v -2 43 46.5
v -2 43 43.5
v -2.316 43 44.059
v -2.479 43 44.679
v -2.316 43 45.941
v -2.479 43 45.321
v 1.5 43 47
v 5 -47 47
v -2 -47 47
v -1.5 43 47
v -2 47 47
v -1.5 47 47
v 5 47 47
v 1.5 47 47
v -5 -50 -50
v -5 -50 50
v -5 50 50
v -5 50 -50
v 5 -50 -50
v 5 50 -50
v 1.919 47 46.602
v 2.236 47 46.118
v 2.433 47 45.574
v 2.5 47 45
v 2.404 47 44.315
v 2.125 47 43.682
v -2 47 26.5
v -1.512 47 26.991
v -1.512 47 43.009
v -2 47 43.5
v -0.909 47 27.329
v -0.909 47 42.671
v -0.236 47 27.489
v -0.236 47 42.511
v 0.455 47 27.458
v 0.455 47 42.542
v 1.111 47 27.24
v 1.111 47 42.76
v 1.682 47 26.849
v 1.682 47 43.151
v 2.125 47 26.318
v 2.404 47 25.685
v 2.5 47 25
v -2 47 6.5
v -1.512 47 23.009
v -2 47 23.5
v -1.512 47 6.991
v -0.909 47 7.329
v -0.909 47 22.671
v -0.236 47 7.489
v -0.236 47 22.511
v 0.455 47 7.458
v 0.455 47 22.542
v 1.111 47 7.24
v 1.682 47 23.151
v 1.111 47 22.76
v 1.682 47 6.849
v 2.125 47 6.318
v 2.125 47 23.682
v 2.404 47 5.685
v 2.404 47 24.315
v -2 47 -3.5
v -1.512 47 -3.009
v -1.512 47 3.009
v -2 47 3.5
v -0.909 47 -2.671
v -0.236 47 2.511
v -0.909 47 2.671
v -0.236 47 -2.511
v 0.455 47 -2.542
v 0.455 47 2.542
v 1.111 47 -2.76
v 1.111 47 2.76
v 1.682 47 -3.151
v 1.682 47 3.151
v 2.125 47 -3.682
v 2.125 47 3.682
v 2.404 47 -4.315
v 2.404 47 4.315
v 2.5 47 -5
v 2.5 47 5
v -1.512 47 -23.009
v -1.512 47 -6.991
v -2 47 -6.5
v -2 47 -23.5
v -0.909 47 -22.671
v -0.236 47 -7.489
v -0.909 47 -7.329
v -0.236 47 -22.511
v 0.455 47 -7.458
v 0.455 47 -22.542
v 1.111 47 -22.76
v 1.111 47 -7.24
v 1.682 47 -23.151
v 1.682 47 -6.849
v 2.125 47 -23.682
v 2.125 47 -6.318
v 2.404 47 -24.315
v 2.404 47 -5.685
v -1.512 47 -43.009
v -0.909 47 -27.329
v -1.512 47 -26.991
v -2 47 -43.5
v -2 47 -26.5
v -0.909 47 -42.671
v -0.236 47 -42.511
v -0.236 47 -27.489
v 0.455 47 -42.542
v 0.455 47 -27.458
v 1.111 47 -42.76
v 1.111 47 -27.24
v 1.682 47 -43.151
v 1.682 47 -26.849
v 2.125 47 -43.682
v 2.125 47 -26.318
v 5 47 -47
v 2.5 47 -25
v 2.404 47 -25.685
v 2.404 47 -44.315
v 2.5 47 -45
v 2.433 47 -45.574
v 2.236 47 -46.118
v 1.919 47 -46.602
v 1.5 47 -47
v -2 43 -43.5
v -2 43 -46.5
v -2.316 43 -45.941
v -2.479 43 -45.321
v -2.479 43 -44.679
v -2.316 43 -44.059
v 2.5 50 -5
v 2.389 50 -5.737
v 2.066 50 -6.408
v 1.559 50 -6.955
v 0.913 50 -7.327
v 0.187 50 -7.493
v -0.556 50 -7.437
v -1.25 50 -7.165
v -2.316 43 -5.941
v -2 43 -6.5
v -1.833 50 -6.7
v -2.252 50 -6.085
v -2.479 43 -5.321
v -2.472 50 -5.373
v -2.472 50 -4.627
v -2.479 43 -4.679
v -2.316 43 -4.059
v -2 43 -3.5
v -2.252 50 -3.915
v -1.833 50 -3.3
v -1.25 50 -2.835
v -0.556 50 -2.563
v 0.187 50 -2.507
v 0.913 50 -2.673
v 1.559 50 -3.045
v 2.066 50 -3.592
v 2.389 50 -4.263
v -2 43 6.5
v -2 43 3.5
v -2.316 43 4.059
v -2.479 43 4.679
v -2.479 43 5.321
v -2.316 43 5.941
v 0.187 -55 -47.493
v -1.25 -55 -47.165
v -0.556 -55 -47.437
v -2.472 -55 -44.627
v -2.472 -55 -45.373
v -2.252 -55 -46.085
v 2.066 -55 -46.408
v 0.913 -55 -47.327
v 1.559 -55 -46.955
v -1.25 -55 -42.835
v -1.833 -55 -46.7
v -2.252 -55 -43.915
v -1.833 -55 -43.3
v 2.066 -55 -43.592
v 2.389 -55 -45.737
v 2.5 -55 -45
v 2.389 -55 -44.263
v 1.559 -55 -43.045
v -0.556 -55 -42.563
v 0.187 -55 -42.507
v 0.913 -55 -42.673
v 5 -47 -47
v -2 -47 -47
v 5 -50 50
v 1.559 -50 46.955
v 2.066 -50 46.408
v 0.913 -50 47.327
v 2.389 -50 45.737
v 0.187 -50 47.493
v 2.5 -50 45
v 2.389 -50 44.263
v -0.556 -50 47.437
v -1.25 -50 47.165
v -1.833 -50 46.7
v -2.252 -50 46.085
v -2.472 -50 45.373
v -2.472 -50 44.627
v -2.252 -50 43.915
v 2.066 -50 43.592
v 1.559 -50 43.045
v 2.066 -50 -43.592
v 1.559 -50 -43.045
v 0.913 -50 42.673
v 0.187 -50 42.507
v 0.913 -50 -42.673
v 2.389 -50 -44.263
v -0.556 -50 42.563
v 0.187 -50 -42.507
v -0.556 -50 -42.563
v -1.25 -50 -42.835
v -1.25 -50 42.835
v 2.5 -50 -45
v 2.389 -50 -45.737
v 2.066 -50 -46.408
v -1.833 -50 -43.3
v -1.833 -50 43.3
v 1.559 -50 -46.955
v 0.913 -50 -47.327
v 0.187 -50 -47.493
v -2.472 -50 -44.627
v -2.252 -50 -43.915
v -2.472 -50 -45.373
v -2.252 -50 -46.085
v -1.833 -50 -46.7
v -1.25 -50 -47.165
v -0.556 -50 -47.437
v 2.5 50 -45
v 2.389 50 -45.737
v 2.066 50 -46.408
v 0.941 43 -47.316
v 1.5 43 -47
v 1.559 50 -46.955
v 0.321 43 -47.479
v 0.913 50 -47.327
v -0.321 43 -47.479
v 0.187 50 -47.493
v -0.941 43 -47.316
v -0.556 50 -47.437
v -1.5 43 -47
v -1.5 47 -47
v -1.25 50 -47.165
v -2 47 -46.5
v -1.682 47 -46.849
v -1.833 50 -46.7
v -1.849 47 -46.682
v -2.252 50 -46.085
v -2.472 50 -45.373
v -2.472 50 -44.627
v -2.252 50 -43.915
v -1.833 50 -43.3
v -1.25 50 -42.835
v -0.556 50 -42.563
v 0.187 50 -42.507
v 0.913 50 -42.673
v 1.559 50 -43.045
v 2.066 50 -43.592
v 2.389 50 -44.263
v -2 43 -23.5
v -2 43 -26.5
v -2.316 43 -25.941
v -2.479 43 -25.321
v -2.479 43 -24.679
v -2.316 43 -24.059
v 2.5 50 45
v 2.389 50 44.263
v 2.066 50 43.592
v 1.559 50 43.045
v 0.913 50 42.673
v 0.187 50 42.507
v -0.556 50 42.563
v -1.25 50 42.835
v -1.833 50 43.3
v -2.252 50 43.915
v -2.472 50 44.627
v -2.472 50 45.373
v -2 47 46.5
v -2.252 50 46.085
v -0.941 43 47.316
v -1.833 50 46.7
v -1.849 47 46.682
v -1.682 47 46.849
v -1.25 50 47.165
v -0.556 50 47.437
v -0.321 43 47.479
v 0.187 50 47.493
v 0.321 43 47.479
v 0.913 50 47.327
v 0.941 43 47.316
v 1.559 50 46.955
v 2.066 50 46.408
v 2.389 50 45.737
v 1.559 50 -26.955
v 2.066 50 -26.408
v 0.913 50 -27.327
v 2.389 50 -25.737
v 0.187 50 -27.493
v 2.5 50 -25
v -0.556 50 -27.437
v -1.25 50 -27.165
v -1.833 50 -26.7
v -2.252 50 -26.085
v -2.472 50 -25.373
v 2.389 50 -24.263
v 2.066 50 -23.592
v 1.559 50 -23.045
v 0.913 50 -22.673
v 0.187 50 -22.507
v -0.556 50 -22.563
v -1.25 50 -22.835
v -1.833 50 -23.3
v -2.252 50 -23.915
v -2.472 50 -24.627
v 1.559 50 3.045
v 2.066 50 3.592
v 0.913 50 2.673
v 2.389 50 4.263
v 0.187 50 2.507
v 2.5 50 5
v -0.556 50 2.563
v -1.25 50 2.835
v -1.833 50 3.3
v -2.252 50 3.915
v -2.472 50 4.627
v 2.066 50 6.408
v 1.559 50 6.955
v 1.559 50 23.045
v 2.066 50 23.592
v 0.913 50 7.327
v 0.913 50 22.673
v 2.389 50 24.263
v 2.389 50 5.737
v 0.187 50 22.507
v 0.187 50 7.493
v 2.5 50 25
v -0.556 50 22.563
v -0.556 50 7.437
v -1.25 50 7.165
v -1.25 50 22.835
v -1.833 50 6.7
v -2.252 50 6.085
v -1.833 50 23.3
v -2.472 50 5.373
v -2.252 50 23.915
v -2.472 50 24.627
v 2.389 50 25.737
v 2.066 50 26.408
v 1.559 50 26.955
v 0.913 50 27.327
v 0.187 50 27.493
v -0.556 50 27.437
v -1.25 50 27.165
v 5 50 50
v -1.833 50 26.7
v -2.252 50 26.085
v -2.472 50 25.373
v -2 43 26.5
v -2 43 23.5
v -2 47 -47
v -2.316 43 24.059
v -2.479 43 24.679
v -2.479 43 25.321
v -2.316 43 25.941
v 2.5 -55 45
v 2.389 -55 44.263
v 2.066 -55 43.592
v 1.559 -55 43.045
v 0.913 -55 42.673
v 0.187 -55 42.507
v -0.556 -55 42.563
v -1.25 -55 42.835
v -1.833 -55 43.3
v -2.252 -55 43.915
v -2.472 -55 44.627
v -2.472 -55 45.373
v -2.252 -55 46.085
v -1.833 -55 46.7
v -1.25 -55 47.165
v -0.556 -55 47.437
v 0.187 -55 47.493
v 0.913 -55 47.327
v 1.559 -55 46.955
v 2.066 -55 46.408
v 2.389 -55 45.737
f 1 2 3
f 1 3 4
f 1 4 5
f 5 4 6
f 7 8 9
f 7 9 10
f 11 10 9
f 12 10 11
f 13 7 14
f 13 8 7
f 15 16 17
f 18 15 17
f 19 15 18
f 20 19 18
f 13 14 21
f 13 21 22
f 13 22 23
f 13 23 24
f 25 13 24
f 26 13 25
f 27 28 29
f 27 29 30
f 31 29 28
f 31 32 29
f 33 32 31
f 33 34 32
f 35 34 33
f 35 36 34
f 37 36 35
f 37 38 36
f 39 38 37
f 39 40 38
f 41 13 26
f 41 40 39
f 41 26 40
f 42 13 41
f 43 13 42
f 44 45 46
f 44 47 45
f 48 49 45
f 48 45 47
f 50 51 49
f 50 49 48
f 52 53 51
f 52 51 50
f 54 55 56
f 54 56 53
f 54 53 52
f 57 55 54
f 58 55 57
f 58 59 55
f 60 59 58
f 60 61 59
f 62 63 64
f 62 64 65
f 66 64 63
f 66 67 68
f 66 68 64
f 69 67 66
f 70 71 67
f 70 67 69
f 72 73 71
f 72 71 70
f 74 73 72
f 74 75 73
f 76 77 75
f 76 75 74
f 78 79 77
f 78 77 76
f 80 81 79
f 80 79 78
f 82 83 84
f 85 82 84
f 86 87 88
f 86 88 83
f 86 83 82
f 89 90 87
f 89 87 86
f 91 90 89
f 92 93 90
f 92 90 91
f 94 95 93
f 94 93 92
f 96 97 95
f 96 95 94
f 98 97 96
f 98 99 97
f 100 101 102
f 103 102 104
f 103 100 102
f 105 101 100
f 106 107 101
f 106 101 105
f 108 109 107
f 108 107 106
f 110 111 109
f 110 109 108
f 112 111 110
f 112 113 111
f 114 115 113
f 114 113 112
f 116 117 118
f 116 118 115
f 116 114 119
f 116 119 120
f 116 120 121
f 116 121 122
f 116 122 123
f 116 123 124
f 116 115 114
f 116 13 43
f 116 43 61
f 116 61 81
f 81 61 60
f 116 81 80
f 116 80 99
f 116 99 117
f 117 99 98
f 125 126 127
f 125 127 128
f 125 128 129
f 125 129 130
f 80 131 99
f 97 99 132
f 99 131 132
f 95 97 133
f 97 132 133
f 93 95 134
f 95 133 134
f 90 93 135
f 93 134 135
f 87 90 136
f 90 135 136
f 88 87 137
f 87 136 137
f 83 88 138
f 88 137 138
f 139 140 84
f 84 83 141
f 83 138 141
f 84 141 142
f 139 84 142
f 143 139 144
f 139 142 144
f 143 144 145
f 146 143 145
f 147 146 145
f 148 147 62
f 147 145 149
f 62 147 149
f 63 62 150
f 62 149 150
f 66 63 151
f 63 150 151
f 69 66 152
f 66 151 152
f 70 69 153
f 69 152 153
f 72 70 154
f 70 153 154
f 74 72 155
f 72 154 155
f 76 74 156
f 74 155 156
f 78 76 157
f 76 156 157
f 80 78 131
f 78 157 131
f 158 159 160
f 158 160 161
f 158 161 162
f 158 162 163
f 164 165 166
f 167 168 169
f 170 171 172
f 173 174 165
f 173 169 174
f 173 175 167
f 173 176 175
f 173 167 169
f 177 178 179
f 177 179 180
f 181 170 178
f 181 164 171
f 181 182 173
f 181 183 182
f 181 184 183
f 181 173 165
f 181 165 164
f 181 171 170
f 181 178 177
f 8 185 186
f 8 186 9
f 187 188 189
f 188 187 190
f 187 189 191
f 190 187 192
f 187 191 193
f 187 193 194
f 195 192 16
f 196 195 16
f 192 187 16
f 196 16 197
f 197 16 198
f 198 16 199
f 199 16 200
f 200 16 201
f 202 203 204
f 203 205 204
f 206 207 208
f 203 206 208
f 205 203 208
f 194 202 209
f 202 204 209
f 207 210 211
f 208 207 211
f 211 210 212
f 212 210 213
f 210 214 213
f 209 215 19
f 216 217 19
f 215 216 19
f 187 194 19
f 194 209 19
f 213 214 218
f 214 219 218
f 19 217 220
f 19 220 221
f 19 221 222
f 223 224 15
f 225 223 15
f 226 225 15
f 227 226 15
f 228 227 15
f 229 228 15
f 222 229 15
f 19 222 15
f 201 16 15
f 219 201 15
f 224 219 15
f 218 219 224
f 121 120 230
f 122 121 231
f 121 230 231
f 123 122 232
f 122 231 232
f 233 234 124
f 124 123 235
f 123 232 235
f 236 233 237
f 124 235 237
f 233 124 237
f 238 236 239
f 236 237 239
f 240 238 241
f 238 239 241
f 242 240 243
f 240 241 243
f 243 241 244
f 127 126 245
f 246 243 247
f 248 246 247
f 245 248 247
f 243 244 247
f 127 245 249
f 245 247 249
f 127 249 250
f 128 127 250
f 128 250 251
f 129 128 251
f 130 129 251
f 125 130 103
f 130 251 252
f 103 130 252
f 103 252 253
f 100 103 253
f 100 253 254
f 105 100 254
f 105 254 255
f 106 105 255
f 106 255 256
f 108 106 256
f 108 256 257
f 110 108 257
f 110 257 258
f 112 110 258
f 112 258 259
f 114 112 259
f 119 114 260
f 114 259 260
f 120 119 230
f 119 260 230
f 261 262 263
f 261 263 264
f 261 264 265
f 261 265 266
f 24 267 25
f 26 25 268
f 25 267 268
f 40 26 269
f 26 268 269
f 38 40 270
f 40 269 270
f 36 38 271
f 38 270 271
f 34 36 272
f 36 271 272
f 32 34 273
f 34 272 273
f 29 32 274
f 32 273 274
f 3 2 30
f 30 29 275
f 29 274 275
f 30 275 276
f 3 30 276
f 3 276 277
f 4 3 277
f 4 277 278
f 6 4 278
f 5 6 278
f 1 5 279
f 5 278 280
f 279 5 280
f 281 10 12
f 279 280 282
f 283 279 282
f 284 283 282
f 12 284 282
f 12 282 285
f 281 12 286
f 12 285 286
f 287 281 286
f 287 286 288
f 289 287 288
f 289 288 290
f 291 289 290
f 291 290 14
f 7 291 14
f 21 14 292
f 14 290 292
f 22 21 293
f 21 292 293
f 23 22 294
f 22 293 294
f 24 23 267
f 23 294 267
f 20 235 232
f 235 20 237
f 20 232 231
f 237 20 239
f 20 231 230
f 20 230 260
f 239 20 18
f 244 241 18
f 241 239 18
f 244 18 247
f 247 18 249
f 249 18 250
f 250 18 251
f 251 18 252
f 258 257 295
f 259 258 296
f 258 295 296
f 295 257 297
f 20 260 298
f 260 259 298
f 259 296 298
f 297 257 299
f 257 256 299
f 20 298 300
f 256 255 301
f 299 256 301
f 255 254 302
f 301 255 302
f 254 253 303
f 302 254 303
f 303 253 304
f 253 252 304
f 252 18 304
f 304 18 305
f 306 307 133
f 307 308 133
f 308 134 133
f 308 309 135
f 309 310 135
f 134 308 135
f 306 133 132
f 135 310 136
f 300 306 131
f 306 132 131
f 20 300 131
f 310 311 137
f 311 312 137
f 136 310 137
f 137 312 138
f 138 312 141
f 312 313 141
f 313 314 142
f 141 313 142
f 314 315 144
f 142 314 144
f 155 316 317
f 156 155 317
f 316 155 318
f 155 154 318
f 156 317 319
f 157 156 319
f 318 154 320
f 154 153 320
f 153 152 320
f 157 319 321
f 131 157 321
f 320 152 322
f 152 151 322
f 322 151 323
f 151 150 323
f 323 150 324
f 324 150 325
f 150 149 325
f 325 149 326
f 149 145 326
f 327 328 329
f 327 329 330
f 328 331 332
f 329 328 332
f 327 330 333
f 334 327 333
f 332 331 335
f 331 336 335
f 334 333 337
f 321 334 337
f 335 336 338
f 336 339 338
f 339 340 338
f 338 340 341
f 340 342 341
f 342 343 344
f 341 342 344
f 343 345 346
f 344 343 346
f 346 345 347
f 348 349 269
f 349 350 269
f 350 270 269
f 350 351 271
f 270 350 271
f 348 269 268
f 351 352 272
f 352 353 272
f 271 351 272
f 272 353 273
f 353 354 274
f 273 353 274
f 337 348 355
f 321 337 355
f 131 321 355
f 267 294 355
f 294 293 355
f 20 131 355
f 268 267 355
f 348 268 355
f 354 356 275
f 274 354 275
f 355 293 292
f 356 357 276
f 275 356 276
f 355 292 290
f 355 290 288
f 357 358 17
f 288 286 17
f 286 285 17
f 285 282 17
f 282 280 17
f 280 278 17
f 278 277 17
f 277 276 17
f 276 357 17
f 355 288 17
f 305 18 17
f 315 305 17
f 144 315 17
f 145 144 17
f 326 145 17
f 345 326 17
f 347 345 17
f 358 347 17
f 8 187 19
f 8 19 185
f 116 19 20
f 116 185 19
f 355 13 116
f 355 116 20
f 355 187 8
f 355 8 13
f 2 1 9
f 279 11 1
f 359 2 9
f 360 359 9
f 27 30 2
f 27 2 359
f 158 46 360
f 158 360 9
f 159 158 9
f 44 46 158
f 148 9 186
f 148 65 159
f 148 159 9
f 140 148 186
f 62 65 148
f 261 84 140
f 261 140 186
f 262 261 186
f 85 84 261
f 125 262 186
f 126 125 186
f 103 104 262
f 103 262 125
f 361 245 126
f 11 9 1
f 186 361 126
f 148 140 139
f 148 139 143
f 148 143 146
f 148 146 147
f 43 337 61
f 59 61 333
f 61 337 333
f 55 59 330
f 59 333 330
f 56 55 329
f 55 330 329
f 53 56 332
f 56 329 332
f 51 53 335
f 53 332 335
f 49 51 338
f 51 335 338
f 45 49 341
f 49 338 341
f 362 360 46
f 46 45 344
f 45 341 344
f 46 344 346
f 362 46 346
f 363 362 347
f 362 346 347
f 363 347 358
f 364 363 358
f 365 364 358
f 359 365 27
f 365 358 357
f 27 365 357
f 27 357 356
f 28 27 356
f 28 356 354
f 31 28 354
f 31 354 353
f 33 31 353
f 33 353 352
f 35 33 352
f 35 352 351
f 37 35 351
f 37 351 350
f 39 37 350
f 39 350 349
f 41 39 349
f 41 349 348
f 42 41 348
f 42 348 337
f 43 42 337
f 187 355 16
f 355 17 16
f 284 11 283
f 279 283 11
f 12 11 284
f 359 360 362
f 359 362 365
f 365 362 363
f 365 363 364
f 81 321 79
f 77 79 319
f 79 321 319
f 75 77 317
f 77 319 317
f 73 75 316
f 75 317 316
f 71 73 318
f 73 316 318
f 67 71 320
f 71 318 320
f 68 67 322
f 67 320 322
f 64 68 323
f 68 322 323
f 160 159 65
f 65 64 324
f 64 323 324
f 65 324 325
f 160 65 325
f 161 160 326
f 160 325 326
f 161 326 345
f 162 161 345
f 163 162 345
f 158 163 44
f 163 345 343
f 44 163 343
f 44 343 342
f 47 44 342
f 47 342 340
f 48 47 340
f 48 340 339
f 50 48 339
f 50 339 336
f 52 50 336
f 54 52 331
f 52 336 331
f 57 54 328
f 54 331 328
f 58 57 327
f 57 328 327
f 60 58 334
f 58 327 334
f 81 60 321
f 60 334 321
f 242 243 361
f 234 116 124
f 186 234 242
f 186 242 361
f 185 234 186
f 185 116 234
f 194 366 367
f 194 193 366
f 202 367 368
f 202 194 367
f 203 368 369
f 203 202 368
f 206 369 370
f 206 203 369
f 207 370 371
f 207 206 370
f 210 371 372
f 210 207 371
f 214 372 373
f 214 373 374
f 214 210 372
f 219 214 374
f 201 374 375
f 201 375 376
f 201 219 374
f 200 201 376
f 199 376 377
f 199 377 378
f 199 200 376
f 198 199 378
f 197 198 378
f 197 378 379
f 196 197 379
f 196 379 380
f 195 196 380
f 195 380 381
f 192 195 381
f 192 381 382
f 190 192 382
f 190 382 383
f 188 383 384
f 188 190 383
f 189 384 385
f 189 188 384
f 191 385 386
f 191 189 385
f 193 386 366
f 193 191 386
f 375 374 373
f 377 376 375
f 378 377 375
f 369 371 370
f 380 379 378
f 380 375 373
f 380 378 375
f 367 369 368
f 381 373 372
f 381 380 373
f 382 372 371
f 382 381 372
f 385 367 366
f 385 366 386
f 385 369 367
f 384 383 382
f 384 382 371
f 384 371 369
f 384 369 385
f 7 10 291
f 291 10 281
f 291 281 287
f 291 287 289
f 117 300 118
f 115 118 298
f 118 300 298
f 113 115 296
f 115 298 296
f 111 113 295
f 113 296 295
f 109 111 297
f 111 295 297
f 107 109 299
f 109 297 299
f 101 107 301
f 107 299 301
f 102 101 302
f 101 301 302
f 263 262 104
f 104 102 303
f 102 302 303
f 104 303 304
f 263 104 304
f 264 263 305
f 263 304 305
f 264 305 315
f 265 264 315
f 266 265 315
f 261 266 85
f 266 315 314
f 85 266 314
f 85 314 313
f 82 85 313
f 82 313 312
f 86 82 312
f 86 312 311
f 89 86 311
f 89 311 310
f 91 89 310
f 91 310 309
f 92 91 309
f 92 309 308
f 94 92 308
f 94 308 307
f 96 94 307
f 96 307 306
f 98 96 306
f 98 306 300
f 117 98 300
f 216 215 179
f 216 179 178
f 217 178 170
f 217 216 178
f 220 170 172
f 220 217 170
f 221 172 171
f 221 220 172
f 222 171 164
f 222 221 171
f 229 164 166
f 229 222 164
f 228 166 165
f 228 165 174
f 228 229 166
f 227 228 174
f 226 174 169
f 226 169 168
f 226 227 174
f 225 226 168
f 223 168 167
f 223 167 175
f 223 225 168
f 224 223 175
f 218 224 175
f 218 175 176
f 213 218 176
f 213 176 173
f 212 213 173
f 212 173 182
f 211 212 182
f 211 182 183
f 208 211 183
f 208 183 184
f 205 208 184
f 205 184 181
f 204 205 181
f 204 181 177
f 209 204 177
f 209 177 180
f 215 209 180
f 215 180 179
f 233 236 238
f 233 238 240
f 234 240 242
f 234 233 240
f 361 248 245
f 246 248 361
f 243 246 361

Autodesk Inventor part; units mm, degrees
sketch "Sketch2" plane through (0, 0, 0) normal (1, 0, 0) x (0, 1, 0)
  line L0 (50, 50) -> (-50, 50)
  line L1 (-50, 50) -> (-50, -50)
  line L2 (-50, -50) -> (50, -50)
  line L3 (50, -50) -> (50, 50)
  line L4 (-70, 0) -> (70, 0) projected
  line L5 (0, 70) -> (0, -70) projected
  point P0 (0, 0)
  point P1 (50, 0)
  point P2 (0, 50)
  dimension "d0" = 100
  dimension "d1" = 100
extrude "Extrusion1" add sketch "Sketch2" along normal mid plane 10
sketch "Sketch3" plane through (5, 0, 0) normal (1, 0, 0) x (0, 0, -1)
  line L0 (-47, 47) -> (47, 47)
  line L1 (47, 47) -> (47, -47)
  line L2 (47, -47) -> (-47, -47)
  line L3 (-47, -47) -> (-47, 47)
  line L4 (0, -70) -> (0, 70) projected
  line L5 (-70, 0) -> (70, 0) projected
  point P0 (0, 0)
  point P1 (0, 47)
  point P2 (-47, 0)
  dimension "d4" = 94
  dimension "d5" = 94
extrude "Extrusion2" cut sketch "Sketch3" against normal blind 7
sketch "Sketch5" plane through (-5, 50, 50) normal (0, 1, 0) x (1, 0, 0)
  circle A0 centre (5, 5) radius 2.5
  line L0 (10, 0) -> (0, 0) projected
  line L1 (5, 120) -> (5, -20) projected
  circle A1 centre (5, 25) radius 2.5
  circle A2 centre (5, 45) radius 2.5
  circle A3 centre (5, 95) radius 2.5
  line L2 (0, 100) -> (10, 100) projected
  circle A4 centre (5, 75) radius 2.5
  circle A5 centre (5, 55) radius 2.5
  point P0 (5, 50)
  dimension "d26" = 5
  dimension "d27" = 5
  dimension "d30" = 20
  dimension "d35" = 5
  dimension "d36" = 5
  dimension "d39" = 20
extrude "Extrusion3" cut sketch "Sketch5" against normal blind 7
sketch "Sketch6" plane through (-5, -50, -50) normal (0, -1, 0) x (1, 0, 0)
  circle A0 centre (5, 95) radius 2.5
  line L0 (0, 100) -> (10, 100) projected
  line L1 (5, -20) -> (5, 120) projected
  line L2 (5, 120) -> (5, -20) projected
  line L3 (0, 0) -> (10, 0) projected
  line L4 (-2, 50) -> (12, 50) projected
  circle A1 centre (5, 5) radius 2.5
  point P0 (5, 50)
  dimension "d46" = 5
  dimension "d47" = 5
extrude "Extrusion4" add sketch "Sketch6" along normal blind 5
properties part number "Wall"
